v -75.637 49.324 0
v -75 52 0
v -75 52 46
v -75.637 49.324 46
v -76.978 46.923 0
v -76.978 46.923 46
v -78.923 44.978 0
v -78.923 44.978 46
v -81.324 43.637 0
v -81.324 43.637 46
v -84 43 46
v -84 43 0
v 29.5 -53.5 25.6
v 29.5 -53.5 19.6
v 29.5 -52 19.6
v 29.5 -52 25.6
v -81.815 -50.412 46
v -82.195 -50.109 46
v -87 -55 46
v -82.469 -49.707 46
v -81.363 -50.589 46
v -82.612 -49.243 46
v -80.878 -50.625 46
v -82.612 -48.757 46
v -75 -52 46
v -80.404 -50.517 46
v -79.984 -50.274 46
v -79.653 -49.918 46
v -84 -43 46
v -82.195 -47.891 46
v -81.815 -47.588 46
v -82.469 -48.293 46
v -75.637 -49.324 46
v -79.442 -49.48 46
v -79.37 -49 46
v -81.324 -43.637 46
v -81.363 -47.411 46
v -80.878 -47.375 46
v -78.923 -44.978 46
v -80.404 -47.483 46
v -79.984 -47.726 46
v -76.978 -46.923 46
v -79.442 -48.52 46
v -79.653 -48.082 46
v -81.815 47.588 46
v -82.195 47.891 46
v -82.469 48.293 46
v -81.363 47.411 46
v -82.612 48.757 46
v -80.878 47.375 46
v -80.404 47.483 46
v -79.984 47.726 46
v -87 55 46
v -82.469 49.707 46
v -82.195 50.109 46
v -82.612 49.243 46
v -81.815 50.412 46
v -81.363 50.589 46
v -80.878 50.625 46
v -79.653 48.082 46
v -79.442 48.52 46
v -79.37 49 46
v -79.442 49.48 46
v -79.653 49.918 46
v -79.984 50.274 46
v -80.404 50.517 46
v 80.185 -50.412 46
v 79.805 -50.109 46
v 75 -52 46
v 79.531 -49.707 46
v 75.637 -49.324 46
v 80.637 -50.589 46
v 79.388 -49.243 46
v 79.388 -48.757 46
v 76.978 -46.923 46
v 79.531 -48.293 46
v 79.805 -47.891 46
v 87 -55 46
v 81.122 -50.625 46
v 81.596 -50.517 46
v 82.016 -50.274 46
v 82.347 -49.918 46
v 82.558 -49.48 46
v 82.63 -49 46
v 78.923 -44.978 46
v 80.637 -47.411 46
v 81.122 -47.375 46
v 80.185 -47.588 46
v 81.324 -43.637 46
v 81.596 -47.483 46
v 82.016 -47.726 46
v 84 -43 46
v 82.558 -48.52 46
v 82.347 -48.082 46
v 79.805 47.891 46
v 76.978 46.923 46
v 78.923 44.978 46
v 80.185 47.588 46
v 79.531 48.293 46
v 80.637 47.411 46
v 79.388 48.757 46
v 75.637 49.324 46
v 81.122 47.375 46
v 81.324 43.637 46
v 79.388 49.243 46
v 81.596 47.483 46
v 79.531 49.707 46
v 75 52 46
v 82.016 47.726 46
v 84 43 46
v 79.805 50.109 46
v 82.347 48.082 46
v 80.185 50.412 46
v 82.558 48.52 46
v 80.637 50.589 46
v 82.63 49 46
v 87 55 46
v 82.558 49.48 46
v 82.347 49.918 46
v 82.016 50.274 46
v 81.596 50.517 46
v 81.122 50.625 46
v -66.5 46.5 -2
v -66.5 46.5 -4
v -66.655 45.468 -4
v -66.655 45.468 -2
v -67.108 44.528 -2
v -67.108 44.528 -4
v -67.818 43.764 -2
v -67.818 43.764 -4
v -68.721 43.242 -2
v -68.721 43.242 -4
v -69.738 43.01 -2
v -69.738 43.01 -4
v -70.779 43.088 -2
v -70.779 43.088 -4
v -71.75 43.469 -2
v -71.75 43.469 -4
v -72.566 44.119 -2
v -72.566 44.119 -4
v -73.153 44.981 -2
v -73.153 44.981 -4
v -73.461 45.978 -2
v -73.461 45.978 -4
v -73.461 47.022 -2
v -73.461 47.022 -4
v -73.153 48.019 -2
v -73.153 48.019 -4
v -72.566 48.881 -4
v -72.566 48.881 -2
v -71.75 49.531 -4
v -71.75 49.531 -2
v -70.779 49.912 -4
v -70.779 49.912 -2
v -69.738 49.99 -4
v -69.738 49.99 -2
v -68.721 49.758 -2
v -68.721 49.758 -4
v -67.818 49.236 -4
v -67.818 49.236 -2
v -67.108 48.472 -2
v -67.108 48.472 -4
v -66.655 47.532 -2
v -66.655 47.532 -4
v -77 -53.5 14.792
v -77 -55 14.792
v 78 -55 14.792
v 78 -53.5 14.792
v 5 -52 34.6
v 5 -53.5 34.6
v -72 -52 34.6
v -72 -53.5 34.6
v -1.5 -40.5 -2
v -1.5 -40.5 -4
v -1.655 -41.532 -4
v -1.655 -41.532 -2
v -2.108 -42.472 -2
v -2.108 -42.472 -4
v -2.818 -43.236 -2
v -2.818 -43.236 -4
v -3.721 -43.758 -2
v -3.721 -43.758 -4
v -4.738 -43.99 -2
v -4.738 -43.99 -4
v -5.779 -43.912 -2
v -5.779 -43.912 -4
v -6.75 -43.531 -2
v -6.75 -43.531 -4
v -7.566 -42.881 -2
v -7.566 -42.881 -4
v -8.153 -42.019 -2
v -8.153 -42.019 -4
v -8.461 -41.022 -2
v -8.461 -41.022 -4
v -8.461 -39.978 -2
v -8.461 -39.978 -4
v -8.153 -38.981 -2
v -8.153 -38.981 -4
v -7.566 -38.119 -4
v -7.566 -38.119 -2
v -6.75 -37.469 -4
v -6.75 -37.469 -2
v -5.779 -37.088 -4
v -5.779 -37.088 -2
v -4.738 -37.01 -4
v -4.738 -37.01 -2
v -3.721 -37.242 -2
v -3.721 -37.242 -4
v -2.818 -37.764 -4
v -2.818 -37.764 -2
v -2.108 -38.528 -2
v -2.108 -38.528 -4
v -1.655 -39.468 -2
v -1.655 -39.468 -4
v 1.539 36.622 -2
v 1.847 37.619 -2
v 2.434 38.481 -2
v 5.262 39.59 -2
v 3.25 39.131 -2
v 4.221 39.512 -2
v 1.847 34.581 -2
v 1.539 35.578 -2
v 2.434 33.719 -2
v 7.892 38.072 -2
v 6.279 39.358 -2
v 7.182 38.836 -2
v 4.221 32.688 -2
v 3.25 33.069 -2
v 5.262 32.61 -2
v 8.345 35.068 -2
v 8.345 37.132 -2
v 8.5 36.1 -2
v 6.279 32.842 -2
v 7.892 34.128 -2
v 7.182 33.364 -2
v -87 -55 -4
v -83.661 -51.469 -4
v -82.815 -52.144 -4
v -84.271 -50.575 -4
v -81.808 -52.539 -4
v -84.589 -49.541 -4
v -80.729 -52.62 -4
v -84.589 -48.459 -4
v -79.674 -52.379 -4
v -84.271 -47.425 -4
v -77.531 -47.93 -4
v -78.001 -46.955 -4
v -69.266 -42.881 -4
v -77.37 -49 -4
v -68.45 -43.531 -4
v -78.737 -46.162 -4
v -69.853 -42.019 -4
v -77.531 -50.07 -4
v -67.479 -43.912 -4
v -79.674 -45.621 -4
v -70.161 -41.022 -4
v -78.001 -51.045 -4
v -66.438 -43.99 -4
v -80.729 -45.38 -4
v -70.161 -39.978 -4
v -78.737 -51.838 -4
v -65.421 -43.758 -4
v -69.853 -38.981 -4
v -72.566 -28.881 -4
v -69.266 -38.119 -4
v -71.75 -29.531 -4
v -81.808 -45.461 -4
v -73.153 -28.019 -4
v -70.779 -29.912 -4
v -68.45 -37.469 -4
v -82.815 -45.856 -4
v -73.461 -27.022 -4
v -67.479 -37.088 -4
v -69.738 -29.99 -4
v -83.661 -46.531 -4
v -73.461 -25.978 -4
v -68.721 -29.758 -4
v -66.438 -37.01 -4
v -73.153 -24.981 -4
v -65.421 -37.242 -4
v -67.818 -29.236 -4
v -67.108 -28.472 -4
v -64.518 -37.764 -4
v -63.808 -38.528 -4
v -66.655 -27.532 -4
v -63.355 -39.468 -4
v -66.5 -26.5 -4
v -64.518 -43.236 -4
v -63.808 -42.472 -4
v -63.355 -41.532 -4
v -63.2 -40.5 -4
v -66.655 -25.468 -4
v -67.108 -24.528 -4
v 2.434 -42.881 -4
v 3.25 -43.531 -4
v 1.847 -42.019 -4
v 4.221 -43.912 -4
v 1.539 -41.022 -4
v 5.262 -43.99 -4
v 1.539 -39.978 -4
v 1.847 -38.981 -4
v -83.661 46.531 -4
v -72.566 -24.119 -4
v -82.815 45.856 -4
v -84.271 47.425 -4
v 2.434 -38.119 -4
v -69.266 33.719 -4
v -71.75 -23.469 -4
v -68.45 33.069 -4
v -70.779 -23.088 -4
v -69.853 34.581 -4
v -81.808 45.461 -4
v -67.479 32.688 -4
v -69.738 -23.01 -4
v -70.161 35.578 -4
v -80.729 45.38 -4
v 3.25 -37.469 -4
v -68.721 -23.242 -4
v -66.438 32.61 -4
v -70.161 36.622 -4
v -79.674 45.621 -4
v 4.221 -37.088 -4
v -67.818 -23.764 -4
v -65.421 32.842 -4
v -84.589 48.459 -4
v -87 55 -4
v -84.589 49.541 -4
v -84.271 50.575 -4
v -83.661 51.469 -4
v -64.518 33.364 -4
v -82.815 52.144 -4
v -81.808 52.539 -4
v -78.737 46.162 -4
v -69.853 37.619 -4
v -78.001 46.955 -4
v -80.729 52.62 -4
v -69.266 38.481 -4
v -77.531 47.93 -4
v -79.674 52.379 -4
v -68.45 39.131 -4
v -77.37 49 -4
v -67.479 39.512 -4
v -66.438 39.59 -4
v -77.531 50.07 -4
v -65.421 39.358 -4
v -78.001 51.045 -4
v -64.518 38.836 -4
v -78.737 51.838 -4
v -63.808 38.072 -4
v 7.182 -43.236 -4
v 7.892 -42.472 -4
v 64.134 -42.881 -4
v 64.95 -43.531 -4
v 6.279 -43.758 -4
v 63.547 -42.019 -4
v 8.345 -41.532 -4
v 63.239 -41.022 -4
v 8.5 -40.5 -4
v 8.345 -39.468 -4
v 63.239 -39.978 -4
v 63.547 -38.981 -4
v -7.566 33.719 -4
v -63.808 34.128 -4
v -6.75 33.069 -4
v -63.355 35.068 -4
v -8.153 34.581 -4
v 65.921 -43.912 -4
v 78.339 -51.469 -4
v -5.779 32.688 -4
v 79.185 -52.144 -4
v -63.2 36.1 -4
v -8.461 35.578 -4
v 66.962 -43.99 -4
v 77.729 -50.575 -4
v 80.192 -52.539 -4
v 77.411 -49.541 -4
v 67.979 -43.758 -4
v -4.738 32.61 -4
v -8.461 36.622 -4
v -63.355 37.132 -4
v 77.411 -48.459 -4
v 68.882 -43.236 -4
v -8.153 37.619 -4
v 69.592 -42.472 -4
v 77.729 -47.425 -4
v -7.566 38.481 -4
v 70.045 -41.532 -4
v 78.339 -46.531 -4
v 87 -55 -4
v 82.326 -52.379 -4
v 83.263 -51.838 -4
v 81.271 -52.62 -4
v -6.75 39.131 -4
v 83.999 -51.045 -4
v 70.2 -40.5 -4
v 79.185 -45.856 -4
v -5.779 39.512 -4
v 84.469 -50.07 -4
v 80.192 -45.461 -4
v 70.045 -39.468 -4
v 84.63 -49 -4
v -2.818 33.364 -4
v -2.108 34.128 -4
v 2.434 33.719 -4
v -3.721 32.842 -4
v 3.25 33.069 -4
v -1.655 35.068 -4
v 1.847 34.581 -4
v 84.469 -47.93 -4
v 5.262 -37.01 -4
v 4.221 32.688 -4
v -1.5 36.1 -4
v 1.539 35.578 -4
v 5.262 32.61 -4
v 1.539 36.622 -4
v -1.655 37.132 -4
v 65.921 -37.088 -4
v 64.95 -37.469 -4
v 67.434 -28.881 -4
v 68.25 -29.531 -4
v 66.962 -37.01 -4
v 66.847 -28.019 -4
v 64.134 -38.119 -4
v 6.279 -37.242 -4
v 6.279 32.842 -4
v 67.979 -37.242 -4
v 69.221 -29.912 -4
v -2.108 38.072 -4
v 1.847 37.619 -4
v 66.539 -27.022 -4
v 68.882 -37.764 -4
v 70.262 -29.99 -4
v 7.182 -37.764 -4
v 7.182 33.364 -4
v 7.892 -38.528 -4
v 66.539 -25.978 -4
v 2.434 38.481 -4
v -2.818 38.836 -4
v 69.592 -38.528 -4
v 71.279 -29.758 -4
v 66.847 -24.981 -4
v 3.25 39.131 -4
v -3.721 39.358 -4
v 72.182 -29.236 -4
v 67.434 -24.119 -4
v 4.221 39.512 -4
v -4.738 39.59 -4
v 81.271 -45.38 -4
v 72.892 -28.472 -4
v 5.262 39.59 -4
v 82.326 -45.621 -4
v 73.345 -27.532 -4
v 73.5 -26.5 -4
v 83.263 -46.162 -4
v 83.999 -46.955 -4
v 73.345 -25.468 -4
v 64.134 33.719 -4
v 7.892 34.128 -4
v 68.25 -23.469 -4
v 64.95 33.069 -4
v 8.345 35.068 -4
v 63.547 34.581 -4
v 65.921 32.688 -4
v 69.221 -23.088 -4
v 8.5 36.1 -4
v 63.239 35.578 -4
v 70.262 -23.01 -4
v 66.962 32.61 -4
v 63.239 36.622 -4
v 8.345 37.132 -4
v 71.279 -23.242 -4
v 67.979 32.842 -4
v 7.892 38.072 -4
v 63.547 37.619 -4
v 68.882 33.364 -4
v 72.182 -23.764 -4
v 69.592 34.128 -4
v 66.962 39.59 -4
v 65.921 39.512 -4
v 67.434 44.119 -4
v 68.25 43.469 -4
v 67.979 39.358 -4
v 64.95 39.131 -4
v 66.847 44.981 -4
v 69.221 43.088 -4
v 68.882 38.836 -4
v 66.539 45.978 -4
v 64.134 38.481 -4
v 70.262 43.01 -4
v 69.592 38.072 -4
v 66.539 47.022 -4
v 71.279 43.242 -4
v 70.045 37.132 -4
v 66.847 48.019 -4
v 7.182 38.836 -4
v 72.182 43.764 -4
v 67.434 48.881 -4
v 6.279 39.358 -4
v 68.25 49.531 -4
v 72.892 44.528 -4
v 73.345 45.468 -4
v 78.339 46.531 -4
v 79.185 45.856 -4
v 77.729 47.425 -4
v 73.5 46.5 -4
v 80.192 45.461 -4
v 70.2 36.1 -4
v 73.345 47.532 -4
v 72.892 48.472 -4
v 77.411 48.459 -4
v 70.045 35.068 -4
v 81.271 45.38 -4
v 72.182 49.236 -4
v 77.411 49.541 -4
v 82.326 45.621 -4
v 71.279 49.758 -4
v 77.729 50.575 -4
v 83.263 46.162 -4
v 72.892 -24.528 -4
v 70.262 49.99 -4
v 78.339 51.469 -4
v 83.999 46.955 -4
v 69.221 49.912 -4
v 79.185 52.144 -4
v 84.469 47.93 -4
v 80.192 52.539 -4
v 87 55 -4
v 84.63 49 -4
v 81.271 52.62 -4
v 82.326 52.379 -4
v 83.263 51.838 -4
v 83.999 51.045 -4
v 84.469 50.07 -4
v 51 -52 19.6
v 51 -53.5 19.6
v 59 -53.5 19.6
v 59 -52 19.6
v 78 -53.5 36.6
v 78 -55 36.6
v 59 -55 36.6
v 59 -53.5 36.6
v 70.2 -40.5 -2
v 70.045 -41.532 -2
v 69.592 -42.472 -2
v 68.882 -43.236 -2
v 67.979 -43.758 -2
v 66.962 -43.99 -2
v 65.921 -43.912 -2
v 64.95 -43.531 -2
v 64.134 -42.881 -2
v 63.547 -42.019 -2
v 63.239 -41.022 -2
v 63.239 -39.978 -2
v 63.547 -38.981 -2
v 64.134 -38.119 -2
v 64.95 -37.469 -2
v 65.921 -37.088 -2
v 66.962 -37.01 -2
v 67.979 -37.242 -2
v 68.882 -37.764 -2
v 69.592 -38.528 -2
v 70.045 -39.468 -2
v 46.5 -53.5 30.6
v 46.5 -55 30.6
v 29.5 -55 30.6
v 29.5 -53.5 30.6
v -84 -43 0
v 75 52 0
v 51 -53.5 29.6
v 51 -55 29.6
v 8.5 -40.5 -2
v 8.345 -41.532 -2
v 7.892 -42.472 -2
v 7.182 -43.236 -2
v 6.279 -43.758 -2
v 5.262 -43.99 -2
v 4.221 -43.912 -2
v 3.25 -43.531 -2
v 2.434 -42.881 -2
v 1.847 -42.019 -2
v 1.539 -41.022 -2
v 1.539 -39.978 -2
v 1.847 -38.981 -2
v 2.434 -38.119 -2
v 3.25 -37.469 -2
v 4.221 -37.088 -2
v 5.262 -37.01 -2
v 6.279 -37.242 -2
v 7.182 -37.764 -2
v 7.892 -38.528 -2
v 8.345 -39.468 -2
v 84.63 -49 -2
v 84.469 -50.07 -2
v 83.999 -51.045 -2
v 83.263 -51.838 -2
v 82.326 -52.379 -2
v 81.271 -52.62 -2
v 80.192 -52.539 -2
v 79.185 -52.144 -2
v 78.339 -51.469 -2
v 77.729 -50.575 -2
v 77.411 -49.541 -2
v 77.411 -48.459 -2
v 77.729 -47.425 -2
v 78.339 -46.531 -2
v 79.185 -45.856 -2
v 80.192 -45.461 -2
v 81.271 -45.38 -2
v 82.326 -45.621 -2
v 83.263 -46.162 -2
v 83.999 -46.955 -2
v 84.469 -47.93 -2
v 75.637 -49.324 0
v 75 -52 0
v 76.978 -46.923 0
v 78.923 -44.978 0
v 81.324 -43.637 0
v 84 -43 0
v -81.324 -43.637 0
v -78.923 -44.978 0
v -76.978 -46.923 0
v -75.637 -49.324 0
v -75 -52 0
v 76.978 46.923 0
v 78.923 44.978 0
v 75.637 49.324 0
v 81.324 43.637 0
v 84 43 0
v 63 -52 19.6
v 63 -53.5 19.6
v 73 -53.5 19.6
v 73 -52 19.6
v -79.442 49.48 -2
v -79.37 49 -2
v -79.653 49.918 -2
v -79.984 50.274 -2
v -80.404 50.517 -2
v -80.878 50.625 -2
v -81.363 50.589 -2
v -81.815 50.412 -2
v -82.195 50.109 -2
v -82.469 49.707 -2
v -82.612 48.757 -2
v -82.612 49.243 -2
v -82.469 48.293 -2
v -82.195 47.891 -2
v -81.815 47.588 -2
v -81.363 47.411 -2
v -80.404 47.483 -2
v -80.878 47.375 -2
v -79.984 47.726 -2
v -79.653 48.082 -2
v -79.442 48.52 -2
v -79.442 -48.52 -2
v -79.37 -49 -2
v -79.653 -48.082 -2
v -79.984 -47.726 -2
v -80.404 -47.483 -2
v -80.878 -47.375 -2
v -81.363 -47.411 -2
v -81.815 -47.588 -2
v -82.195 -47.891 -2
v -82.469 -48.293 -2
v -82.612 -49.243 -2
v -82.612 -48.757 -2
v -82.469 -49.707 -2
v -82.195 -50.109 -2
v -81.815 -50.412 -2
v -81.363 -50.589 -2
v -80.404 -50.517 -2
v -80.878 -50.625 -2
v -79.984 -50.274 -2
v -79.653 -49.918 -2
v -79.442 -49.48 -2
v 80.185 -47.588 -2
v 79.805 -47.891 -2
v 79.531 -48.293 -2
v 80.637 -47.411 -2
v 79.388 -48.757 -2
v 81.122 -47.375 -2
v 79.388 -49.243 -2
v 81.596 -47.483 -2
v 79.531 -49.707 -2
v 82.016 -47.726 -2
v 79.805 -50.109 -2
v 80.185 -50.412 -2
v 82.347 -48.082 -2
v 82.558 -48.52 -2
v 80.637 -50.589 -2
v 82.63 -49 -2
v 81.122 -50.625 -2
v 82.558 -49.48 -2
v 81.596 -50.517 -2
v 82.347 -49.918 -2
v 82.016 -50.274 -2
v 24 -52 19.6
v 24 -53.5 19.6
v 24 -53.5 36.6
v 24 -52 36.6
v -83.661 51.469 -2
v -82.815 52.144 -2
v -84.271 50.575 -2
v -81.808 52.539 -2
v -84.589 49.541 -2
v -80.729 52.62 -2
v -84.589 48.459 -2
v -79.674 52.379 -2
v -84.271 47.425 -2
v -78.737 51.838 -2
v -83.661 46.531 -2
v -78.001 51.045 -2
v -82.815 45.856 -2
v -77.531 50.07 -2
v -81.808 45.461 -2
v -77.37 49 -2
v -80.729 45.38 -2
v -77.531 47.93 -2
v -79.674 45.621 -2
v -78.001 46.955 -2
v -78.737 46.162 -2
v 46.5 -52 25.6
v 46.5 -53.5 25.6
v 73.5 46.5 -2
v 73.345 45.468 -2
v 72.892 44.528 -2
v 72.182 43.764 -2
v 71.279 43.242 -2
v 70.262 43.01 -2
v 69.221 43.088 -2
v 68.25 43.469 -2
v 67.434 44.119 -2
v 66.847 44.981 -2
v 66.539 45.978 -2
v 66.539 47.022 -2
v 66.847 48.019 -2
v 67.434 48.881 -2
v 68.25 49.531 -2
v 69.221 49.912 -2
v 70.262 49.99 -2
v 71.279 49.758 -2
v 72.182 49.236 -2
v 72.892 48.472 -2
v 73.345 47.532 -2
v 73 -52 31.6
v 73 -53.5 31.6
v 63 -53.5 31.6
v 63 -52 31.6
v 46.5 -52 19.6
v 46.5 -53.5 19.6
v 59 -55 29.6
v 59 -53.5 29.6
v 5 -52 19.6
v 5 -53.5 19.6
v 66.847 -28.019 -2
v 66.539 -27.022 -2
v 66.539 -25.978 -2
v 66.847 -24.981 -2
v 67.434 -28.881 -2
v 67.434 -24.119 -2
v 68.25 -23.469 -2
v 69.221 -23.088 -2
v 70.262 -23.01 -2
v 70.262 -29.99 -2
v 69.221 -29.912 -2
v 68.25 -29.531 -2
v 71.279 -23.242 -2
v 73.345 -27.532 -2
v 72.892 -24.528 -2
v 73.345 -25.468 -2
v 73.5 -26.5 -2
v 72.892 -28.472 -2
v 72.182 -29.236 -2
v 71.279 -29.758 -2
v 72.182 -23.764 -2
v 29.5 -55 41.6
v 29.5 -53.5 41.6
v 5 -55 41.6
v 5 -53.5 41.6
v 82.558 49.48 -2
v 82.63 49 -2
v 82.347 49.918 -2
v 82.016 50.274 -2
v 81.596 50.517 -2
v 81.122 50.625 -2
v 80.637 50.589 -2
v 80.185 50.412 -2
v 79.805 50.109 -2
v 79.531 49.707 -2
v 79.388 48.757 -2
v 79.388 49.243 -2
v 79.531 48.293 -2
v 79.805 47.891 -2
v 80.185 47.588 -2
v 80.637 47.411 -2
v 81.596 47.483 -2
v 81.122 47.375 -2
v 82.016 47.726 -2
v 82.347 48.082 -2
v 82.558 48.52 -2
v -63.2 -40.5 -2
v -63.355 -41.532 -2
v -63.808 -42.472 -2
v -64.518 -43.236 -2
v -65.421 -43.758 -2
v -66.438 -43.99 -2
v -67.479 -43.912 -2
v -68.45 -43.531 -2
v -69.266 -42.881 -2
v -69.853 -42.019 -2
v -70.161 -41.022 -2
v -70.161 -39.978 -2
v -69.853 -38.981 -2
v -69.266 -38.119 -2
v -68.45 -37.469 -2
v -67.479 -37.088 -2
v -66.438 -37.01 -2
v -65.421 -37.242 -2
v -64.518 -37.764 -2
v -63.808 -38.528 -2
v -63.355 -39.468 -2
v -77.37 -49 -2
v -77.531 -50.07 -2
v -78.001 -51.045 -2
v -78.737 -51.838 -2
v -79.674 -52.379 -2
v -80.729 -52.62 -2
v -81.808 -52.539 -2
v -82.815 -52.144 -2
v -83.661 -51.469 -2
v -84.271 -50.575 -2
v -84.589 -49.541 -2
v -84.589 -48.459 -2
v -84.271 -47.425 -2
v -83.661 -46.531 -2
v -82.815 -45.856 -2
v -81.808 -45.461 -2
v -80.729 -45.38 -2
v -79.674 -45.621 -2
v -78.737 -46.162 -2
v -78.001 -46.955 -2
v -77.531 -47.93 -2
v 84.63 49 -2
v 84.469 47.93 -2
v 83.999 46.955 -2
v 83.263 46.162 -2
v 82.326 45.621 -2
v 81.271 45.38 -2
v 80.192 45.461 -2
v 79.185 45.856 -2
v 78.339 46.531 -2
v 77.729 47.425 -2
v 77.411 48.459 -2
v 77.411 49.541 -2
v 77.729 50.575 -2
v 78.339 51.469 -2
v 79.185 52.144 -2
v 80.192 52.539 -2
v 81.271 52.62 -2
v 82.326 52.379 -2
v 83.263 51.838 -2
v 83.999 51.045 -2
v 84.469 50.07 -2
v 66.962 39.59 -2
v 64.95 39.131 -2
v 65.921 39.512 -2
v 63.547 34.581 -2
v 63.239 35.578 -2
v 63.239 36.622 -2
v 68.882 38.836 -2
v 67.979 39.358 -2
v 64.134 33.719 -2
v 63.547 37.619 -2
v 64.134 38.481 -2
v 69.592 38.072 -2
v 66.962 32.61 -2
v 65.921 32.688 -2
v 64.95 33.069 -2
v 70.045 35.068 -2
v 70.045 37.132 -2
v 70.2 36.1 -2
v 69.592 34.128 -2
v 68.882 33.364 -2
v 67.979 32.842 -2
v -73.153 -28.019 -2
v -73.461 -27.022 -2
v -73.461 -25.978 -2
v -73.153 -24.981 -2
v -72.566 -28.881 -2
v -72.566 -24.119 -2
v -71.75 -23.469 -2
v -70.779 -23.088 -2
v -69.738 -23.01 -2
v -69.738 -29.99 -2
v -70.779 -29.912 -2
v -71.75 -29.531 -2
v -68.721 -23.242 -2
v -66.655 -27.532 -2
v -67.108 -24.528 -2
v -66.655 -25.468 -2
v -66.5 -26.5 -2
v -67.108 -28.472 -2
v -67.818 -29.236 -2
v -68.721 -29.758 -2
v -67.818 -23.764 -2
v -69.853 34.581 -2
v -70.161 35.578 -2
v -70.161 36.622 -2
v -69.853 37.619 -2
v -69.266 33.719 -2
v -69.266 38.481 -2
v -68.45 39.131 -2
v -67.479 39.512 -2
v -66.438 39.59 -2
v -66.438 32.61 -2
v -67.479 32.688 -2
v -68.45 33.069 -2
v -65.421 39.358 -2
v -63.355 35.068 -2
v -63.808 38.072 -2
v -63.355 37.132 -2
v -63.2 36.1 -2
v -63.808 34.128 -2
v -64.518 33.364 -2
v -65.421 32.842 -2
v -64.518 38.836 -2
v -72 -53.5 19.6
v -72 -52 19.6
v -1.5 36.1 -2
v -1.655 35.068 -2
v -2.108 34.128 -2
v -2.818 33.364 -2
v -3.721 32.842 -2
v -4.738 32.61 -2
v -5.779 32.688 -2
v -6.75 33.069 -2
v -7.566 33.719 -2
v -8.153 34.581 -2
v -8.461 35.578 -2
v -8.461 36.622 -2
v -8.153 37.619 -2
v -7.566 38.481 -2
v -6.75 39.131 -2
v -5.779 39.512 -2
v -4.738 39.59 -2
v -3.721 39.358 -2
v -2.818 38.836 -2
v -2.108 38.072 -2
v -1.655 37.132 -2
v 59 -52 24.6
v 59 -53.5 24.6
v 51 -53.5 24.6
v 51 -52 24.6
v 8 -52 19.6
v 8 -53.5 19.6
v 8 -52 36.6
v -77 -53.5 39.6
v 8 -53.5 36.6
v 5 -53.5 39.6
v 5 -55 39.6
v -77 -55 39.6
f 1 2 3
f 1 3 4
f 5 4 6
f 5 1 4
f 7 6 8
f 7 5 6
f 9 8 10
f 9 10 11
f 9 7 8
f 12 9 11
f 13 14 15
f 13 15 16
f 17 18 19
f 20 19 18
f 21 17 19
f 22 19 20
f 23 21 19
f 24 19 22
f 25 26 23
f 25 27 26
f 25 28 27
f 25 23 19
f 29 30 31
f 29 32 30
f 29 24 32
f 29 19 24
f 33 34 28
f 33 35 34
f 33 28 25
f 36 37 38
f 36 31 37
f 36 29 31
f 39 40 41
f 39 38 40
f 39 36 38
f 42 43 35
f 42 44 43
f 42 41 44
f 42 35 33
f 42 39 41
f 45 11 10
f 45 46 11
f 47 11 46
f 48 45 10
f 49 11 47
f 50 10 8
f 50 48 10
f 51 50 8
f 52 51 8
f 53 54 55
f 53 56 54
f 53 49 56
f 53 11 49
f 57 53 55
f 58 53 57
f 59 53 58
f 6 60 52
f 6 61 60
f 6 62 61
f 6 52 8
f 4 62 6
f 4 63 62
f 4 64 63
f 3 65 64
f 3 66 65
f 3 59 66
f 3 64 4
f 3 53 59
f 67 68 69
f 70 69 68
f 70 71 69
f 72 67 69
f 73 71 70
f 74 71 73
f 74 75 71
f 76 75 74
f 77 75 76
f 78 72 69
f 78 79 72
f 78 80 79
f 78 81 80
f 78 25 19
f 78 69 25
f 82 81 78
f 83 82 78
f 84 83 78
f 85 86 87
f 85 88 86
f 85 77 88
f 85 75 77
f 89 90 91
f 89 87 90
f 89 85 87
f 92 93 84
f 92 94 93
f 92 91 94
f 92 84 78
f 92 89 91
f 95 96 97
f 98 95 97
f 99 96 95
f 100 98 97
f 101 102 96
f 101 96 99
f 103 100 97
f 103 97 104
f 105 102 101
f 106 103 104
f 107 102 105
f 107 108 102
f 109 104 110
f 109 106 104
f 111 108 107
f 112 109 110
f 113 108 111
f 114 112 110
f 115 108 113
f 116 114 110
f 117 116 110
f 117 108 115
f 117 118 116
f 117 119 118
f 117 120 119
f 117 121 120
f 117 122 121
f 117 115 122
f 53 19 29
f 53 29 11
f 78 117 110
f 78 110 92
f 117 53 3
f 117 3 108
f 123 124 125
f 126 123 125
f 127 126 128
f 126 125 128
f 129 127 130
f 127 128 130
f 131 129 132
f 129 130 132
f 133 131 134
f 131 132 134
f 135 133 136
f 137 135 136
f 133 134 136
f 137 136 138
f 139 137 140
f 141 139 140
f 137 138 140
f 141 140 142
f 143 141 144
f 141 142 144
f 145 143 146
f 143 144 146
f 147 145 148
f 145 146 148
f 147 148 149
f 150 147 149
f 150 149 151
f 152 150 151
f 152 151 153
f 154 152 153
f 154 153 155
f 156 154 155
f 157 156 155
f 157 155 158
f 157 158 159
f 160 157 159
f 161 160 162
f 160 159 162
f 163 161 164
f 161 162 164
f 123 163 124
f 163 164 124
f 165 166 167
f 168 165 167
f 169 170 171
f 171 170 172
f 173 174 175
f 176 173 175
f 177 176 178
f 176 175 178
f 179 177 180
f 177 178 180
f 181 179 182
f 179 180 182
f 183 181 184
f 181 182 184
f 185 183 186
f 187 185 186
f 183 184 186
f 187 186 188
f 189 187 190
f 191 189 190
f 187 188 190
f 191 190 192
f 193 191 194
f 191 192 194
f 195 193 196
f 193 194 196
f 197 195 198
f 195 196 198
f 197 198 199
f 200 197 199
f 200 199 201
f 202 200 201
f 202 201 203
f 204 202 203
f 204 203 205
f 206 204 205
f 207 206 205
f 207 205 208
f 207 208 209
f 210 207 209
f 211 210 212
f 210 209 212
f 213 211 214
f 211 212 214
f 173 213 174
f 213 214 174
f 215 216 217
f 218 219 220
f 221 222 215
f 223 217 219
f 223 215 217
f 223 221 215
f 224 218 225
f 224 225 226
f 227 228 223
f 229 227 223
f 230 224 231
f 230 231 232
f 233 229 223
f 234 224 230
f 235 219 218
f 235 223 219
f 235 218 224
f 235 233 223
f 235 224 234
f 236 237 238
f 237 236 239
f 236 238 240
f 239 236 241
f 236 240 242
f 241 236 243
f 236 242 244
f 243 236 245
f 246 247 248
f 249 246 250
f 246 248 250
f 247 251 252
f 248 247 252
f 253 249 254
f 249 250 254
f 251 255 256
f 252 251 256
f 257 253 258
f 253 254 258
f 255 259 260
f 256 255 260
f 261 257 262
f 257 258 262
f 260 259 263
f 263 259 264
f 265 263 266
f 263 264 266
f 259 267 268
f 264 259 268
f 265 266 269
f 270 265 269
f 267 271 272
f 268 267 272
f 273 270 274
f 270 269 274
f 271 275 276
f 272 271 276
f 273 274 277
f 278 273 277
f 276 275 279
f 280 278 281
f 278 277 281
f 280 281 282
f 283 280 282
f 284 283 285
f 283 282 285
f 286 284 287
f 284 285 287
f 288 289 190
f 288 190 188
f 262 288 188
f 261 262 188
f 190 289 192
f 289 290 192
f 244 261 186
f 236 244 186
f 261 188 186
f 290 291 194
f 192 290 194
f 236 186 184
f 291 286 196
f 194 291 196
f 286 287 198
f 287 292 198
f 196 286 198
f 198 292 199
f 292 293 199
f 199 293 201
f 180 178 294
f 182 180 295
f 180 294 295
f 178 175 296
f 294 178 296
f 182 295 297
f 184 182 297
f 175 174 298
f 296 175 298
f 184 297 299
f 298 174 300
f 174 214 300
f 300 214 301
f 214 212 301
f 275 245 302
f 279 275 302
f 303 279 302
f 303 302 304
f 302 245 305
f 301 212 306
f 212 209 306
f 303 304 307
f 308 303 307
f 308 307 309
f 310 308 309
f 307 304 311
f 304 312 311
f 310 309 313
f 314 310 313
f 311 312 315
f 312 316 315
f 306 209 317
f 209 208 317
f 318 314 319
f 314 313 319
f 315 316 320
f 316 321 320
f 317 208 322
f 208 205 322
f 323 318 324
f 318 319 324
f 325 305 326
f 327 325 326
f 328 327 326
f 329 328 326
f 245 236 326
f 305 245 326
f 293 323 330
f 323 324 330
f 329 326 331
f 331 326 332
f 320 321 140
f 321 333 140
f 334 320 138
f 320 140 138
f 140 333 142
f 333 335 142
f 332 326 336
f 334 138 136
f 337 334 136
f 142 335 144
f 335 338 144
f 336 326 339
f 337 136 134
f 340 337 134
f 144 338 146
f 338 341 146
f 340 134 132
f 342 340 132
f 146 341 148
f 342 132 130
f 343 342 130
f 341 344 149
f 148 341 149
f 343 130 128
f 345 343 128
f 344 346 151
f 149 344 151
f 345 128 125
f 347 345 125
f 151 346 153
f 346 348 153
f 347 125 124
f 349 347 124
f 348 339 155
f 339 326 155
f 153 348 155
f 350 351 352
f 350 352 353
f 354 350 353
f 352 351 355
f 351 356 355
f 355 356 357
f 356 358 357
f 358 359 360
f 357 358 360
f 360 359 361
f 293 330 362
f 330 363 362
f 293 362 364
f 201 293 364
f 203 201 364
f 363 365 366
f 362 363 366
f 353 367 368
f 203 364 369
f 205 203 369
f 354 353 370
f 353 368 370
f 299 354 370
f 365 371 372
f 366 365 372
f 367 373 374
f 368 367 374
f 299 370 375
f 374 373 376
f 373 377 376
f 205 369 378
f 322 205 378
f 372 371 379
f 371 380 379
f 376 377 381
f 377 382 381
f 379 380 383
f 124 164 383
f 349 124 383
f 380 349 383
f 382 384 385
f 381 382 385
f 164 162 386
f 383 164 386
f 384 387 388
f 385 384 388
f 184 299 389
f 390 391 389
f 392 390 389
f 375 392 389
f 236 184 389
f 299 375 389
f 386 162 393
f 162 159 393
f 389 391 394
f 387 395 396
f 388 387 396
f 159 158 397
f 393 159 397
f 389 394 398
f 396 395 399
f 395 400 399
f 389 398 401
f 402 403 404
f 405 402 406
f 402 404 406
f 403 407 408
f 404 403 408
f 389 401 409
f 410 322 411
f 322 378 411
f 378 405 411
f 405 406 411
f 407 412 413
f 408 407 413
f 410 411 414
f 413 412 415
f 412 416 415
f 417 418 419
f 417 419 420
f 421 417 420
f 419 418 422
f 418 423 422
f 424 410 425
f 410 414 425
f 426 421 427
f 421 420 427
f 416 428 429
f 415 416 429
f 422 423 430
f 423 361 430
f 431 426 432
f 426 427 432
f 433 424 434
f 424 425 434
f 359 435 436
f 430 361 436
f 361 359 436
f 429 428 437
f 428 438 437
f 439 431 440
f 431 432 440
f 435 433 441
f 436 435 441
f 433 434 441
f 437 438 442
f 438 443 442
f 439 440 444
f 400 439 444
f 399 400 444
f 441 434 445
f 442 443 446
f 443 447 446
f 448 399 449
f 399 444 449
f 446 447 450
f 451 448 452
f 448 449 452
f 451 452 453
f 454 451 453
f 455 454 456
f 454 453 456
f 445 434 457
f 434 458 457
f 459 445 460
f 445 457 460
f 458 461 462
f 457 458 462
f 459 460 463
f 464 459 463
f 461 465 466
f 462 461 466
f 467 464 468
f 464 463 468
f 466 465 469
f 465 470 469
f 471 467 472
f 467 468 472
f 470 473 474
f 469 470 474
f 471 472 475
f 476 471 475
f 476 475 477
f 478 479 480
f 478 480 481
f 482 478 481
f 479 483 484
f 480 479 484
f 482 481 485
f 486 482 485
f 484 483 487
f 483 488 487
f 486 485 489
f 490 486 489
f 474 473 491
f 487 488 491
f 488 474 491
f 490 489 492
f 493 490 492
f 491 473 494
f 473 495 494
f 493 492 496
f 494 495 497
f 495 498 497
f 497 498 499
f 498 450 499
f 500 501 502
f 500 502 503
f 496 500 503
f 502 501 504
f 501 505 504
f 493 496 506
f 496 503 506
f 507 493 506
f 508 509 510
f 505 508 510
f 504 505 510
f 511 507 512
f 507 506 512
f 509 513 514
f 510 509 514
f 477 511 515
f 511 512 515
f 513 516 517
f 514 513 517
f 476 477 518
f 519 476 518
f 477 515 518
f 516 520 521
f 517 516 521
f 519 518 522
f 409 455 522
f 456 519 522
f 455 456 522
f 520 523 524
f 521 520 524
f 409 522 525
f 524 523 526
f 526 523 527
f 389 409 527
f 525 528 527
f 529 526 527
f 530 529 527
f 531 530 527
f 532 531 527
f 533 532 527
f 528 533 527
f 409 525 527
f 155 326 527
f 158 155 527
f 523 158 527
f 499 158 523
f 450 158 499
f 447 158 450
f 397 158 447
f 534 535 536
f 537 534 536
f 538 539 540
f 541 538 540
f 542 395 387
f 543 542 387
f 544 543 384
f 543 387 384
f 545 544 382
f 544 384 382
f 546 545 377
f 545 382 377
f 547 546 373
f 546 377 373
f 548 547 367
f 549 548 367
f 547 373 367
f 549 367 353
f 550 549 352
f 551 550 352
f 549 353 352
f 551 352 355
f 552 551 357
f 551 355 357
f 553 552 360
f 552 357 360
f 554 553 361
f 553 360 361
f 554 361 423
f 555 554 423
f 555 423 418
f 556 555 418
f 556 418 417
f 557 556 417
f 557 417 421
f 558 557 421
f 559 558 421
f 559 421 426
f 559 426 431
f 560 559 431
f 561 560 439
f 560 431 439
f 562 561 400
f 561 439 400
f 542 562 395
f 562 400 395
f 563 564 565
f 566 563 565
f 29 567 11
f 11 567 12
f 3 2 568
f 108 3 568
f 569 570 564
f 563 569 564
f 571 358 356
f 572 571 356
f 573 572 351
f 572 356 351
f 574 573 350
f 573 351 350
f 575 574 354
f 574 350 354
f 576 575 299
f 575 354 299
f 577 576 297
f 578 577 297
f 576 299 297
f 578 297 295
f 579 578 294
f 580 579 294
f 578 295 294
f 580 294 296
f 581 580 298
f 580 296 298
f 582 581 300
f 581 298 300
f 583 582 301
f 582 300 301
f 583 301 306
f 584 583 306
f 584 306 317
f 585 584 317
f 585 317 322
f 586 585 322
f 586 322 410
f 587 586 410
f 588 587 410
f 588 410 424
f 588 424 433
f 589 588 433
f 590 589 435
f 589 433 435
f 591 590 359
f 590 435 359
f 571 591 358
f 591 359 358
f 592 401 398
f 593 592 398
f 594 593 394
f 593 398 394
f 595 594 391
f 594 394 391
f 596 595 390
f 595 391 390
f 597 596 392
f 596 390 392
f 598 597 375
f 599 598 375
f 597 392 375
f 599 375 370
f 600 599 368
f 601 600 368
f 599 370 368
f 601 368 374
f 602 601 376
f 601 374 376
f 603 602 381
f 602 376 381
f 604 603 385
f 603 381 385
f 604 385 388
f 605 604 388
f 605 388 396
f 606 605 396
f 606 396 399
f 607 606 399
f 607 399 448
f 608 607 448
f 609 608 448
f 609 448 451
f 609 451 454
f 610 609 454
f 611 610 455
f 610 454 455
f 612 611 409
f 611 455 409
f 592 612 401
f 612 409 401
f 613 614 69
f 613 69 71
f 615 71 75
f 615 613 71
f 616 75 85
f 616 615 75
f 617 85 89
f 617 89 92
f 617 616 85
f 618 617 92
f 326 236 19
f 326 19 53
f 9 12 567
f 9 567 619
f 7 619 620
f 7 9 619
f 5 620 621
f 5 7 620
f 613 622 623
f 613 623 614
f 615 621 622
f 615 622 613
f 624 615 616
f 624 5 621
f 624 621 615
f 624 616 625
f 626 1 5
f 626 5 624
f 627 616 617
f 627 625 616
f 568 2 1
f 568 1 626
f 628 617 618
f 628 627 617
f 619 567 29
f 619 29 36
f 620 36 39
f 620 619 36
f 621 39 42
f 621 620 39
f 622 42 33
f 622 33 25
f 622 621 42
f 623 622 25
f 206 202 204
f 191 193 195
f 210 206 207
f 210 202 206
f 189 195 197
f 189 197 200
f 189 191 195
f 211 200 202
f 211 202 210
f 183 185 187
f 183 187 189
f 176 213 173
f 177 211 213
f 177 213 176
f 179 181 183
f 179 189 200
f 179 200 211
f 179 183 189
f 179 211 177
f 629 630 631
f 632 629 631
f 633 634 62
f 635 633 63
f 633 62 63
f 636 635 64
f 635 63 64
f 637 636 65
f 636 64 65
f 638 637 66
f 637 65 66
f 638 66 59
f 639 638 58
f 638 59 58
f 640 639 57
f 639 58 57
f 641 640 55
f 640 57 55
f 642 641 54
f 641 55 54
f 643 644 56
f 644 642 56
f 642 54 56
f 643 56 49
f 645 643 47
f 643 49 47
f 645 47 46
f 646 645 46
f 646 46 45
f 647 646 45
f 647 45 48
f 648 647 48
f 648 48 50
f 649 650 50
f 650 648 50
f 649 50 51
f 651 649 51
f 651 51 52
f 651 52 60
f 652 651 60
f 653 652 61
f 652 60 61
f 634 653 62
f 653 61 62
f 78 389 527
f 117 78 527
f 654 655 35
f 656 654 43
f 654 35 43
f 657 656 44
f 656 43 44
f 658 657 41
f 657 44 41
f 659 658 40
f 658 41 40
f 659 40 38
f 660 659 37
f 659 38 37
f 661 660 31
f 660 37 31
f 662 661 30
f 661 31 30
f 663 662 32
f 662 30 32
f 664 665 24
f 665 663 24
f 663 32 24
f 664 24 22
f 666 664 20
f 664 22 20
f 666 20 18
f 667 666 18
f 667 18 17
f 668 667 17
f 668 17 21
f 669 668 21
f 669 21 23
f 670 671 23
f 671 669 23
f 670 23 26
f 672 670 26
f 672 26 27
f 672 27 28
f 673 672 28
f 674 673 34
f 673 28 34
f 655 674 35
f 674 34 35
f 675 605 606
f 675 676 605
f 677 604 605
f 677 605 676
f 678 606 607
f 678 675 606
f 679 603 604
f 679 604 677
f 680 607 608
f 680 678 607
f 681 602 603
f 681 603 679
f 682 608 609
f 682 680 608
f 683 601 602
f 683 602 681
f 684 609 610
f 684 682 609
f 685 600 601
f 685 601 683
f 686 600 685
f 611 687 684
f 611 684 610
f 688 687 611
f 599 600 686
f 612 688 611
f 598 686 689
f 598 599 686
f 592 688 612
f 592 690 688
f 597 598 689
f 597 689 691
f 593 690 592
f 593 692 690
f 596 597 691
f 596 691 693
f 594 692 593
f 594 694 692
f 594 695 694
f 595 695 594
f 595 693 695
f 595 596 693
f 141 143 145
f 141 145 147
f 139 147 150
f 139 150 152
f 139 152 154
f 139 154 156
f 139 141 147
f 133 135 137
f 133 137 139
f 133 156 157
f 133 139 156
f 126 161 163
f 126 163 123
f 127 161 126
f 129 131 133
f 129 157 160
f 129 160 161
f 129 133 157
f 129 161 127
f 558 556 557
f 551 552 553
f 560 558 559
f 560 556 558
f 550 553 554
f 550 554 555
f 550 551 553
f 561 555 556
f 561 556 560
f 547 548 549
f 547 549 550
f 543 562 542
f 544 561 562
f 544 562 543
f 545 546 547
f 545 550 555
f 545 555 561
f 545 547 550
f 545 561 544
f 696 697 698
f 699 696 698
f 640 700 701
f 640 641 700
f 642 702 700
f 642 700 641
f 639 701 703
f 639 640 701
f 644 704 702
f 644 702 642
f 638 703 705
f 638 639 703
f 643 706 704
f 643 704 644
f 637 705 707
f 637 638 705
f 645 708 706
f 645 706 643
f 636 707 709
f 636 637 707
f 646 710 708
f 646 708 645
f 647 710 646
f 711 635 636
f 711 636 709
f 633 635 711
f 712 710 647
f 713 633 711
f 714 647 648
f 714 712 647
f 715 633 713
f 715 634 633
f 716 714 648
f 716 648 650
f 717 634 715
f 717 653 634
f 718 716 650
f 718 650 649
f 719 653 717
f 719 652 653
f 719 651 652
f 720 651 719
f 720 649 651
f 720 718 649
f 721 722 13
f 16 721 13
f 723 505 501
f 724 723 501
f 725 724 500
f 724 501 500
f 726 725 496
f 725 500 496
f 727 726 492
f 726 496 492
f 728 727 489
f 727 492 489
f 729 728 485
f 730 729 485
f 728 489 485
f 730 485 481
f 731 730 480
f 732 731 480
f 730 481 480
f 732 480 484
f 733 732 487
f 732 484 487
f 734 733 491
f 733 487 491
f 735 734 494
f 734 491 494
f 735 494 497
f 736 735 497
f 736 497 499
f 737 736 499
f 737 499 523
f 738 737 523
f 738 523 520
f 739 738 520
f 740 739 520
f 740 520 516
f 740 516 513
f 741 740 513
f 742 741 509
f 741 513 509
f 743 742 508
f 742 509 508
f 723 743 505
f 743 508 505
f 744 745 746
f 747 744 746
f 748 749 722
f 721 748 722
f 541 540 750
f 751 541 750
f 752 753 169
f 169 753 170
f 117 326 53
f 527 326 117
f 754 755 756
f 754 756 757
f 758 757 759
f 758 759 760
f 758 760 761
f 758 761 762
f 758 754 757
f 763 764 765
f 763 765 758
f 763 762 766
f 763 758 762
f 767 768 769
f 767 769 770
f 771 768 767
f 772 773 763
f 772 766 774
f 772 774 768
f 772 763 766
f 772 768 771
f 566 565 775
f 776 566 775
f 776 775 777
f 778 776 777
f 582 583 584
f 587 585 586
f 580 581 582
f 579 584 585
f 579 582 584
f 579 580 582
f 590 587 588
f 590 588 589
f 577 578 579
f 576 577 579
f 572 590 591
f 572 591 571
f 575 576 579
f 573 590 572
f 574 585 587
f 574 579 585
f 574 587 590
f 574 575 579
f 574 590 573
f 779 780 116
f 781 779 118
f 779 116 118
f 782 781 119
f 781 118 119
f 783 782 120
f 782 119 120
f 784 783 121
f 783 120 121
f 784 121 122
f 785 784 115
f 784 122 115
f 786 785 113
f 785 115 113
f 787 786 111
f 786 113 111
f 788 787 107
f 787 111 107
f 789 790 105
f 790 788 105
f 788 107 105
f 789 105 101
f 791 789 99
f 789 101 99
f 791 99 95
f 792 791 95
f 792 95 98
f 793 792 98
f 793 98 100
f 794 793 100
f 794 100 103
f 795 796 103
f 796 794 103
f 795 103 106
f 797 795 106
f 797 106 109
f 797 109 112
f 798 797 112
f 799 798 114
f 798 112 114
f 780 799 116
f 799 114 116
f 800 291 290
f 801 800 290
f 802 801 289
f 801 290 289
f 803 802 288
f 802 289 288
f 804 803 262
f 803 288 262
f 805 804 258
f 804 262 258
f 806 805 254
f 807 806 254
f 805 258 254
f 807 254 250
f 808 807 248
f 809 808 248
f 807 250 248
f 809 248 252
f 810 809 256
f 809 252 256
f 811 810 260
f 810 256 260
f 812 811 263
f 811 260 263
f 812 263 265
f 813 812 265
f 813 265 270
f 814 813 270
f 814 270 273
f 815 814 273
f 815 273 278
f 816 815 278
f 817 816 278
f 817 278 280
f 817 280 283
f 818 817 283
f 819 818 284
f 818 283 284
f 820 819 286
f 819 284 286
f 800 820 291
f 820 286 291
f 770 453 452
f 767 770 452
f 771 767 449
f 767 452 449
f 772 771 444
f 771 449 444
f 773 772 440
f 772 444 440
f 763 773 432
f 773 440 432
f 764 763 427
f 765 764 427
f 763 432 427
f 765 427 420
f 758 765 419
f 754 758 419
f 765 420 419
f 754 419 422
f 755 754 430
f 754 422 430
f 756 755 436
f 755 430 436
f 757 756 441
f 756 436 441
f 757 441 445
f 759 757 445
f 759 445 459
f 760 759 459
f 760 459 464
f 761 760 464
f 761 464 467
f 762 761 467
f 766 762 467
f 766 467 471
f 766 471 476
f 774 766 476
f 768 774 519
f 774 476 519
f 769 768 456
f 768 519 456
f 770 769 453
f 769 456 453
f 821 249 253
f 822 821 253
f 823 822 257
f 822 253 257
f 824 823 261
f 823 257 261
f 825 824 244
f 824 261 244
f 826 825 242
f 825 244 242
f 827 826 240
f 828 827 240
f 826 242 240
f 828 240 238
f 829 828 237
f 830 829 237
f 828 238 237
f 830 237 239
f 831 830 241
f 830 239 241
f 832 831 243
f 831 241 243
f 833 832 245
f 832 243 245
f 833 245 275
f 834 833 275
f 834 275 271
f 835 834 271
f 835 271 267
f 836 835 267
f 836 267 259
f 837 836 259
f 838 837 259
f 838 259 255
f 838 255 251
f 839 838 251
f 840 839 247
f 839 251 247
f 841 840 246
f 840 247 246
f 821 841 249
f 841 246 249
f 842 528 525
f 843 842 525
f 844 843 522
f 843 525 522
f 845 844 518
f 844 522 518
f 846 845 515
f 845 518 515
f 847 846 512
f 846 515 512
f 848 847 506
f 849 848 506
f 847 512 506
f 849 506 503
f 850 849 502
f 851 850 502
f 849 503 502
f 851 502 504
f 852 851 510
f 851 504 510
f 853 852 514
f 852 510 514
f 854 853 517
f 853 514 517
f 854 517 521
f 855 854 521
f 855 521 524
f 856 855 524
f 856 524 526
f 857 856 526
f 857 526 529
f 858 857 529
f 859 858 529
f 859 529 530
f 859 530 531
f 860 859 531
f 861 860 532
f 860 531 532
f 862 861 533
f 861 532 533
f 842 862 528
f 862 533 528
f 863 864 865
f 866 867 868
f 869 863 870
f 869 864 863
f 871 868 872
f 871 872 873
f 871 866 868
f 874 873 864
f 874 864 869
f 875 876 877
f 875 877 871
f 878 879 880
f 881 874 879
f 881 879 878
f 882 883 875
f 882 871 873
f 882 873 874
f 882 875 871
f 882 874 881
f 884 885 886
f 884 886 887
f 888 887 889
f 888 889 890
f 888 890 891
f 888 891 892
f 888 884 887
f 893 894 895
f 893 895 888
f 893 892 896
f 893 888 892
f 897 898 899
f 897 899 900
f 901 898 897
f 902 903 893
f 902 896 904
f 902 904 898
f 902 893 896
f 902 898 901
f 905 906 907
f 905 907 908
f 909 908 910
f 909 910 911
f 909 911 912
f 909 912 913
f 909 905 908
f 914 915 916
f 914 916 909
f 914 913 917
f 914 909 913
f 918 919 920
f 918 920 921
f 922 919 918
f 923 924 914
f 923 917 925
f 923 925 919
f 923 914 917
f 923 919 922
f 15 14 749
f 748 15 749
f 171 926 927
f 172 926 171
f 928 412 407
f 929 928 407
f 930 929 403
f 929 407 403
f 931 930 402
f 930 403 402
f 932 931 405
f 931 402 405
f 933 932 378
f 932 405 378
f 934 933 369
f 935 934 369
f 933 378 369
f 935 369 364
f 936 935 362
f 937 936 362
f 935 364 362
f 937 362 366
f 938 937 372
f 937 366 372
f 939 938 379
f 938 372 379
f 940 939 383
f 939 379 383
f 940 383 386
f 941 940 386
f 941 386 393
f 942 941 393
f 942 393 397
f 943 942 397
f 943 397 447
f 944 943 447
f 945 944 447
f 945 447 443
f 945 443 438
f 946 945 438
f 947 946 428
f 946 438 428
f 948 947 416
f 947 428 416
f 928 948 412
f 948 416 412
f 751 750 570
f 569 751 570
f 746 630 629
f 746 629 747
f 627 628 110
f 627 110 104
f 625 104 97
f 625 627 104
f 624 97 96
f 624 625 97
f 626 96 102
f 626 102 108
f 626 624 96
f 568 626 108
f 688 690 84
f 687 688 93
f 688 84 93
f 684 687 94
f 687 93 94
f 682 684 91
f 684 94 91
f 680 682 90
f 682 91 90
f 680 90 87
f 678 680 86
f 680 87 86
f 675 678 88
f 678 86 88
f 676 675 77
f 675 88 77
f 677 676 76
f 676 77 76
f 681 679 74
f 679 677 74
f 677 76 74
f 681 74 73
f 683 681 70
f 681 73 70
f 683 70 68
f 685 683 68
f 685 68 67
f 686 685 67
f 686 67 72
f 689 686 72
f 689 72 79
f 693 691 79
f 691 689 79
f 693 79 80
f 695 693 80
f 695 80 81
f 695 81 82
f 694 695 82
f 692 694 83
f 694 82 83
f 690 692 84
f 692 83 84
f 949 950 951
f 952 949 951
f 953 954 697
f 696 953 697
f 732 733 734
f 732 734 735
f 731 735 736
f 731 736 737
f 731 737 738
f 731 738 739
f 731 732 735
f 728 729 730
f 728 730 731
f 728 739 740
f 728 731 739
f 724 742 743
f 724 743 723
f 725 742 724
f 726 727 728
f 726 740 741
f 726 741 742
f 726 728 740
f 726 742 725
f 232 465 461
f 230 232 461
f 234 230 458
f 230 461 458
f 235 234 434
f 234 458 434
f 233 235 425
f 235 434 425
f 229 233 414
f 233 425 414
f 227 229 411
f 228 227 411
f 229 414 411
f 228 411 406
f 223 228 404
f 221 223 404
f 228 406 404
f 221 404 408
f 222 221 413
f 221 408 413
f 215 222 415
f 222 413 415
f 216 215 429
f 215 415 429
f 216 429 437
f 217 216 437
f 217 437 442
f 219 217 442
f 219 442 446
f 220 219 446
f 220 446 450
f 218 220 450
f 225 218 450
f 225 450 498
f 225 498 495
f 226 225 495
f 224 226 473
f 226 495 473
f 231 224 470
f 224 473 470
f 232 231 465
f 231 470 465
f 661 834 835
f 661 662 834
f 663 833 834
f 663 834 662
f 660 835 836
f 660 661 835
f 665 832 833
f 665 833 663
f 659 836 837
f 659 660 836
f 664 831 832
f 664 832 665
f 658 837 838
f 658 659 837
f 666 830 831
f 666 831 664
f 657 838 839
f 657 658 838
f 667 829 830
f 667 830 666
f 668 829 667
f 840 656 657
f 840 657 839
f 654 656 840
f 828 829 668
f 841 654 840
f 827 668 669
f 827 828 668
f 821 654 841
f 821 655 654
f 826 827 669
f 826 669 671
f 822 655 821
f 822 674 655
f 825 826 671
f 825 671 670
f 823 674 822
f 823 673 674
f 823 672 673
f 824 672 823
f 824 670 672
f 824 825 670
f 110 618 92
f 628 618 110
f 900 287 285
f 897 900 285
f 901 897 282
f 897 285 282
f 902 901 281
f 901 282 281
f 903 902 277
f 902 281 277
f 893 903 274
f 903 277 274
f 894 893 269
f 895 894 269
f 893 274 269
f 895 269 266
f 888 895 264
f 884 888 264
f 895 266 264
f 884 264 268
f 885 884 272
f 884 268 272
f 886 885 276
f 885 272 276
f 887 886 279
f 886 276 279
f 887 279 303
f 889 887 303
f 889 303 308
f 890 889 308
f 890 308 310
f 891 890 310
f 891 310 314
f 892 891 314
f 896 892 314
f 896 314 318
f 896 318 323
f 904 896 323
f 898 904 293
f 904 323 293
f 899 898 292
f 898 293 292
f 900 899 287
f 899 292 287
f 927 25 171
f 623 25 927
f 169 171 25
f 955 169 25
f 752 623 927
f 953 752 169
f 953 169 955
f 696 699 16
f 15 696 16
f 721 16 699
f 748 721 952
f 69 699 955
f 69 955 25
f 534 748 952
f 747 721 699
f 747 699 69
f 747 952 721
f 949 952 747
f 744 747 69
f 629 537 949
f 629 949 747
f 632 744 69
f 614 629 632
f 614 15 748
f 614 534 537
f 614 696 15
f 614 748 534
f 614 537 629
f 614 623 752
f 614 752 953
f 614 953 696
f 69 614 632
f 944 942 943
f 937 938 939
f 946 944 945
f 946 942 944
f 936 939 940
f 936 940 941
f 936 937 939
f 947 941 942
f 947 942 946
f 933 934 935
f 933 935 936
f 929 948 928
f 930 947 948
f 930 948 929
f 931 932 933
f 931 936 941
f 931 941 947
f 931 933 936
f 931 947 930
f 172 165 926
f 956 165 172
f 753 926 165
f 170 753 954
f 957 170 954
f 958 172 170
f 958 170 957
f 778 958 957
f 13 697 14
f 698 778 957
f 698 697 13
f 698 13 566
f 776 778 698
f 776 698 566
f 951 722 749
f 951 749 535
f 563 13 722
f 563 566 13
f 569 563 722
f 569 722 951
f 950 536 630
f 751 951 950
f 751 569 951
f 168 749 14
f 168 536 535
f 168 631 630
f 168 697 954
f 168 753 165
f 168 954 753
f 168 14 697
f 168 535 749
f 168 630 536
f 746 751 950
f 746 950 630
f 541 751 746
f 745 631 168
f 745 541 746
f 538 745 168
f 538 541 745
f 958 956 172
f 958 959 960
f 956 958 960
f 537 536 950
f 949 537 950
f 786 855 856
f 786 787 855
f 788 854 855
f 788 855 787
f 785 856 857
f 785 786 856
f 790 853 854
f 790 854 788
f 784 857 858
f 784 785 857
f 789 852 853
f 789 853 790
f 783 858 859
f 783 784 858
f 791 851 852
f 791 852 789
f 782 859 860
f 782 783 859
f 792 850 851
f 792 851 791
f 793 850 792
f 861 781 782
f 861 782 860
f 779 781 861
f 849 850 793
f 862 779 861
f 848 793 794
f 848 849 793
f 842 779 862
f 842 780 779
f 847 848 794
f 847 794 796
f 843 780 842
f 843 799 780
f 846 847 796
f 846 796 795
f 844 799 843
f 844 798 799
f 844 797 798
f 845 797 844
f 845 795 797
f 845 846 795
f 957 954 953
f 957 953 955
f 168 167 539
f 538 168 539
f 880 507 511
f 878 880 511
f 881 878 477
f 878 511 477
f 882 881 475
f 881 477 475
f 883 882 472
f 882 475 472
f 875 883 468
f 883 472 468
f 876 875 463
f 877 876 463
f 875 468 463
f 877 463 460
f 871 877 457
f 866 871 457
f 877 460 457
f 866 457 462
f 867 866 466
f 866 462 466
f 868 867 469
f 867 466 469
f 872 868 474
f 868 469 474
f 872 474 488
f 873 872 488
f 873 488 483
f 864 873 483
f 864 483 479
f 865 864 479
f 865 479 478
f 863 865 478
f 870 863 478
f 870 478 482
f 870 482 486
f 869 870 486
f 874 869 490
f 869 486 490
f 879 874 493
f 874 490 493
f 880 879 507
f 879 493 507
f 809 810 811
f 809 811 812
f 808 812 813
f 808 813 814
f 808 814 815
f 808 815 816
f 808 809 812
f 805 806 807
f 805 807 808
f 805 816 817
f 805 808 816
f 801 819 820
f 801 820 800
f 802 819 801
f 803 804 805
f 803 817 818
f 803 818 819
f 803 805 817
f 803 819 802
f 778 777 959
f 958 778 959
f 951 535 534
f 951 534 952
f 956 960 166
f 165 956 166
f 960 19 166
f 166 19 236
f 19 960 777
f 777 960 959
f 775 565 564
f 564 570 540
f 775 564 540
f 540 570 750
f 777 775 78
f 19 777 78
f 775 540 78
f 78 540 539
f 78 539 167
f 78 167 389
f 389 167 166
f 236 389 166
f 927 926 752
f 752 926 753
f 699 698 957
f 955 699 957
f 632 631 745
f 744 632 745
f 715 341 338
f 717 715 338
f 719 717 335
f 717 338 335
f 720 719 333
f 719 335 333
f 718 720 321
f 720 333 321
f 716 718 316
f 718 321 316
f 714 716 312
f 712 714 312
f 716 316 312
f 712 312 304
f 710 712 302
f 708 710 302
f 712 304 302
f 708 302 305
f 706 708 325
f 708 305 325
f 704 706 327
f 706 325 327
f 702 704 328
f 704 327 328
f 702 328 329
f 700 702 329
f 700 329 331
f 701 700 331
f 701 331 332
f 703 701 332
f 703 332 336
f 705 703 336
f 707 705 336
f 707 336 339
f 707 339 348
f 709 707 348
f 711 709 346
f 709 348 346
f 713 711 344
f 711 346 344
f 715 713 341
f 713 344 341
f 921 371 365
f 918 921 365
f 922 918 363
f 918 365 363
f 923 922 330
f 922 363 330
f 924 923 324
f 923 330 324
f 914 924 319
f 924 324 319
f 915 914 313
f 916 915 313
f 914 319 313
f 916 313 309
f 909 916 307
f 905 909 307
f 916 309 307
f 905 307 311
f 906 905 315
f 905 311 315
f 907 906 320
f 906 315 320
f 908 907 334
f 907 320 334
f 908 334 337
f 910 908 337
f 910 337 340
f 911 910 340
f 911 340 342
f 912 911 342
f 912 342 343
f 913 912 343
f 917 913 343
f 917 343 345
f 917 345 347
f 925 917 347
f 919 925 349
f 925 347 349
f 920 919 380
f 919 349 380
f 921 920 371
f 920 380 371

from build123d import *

# Parameters (mm, degrees)
F0_W         = 174
F0_H         = 110
F1_DEPTH     = 4
F2_W         = 174
F2_H         = 110
F2_W_2       = 168
F2_H_2       = 104
F3_DEPTH     = 46
F5_R         = 3.5
F6_DEPTH     = 2
F7_W         = 38.5
F7_H         = 15
F7_W_2       = 8
F7_H_2       = 17
F7_W_3       = 8.5
F7_H_3       = 6
F7_W_4       = 4
F7_H_4       = 5
F7_W_5       = 5
F7_H_5       = 12
F8_DEPTH     = 3
F9_W         = 9
F9_H         = 9
F9_R         = 1.63
F10_DEPTH    = 46
F11_DEPTH    = 50.001
F12_T1_DEPTH = 68.5
F13_R        = 3.63
F13_R_2      = 1.63
F14_DEPTH    = 2
F15_DEPTH    = 1.5


# Not quite as in the source:
# - a fillet or chamfer that OpenCascade refuses, or shapes differently, is made with other operations: its cross-section is extruded or revolved along the edge and cut away or added


with BuildPart() as f1:
    # F0 (on Top) → F1 (new body)
    with BuildSketch(Plane.XY):
        Rectangle(F0_W, F0_H)
    extrude(amount=-F1_DEPTH)

    # F2 (on face) → F3 (join)
    with BuildSketch(Plane.XY):
        Rectangle(F2_W, F2_H)
        Rectangle(F2_W_2, F2_H_2, mode=Mode.SUBTRACT)
    extrude(amount=F3_DEPTH)

    # F5 (on face) → F6 (cut)
    with BuildSketch(Plane(origin=(0, 0, -4), x_dir=(1, 0, 0), z_dir=(0, 0, -1))):
        with Locations((-66.7, 40.5)):
            Circle(F5_R)
        with Locations((-70, 26.5)):
            Circle(F5_R)
        with Locations((-66.7, -36.1)):
            Circle(F5_R)
        with Locations((-70, -46.5)):
            Circle(F5_R)
        with Locations((-5, -36.1)):
            Circle(F5_R)
        with Locations((5, -36.1)):
            Circle(F5_R)
        with Locations((-5, 40.5)):
            Circle(F5_R)
        with Locations((5, 40.5)):
            Circle(F5_R)
        with Locations((66.7, 40.5)):
            Circle(F5_R)
        with Locations((70, 26.5)):
            Circle(F5_R)
        with Locations((66.7, -36.1)):
            Circle(F5_R)
        with Locations((70, -46.5)):
            Circle(F5_R)
    extrude(amount=-F6_DEPTH, mode=Mode.SUBTRACT)

    # F7 (on face) → F8 (cut)
    with BuildSketch(Plane.XZ.offset(55)):
        with Locations((-52.75, 27.1)):
            Rectangle(F7_W, F7_H)
        with Locations((-14.25, 27.1)):
            Rectangle(F7_W, F7_H)
        with Locations((12, 28.1)):
            Rectangle(F7_W_2, F7_H_2)
        with Locations((20, 28.1)):
            Rectangle(F7_W_2, F7_H_2)
        with Locations((33.75, 22.6)):
            Rectangle(F7_W_3, F7_H_3)
        with Locations((42.25, 22.6)):
            Rectangle(F7_W_3, F7_H_3)
        with Locations((53, 22.1)):
            Rectangle(F7_W_4, F7_H_4)
        with Locations((57, 22.1)):
            Rectangle(F7_W_4, F7_H_4)
        with Locations((65.5, 25.6)):
            Rectangle(F7_W_5, F7_H_5)
        with Locations((70.5, 25.6)):
            Rectangle(F7_W_5, F7_H_5)
    extrude(amount=-F8_DEPTH, mode=Mode.SUBTRACT)

    # F9 (on face) → F10 (join)
    with BuildSketch(Plane.XY.offset(46)):
        with Locations((-79.5, 47.5)):
            Rectangle(F9_W, F9_H)
        with Locations((-81, 49)):
            Circle(F9_R, mode=Mode.SUBTRACT)
        Polygon((-75, 55), (-87, 55), (-87, 43), (-84, 43), (-84, 52), (-75, 52), align=None)
        Polygon((87, 55), (75, 55), (75, 52), (84, 52), (84, 43), (87, 43), align=None)
        with Locations((79.5, 47.5)):
            Rectangle(F9_W, F9_H)
        with Locations((81, 49)):
            Circle(F9_R, mode=Mode.SUBTRACT)
        Polygon((87, -55), (87, -43), (84, -43), (84, -52), (75, -52), (75, -55), align=None)
        with Locations((79.5, -47.5)):
            Rectangle(F9_W, F9_H)
        with Locations((81, -49)):
            Circle(F9_R, mode=Mode.SUBTRACT)
        with Locations((-79.5, -47.5)):
            Rectangle(F9_W, F9_H)
        with Locations((-81, -49)):
            Circle(F9_R, mode=Mode.SUBTRACT)
        Polygon((-84, -43), (-87, -43), (-87, -55), (-75, -55), (-75, -52), (-84, -52), align=None)
    extrude(amount=-F10_DEPTH)

    # F9 (on face) → F11 (cut, through all)
    with BuildSketch(Plane.XY.offset(46)):
        with Locations((-81, 49)):
            Circle(F9_R)
        with Locations((81, 49)):
            Circle(F9_R)
        with Locations((81, -49)):
            Circle(F9_R)
        with Locations((-81, -49)):
            Circle(F9_R)
    extrude(amount=-F11_DEPTH, mode=Mode.SUBTRACT)

    # F12: fillet of radius 10 on 4 edges, made by hand

    # F12_s2 → F12_t1 (cut)
    with BuildSketch(Plane.XY):
        with BuildLine():
            ThreePointArc((-75, 52), (-77.8832882455, 45.8832882455), (-84, 43))
            Line((-84, 43), (-75, 43))
            Line((-75, 43), (-75, 52))
        make_face()
        with BuildLine():
            ThreePointArc((84, 43), (77.8832882455, 45.8832882455), (75, 52))
            Line((75, 52), (75, 43))
            Line((75, 43), (84, 43))
        make_face()
        with BuildLine():
            ThreePointArc((-84, -43), (-77.8832882455, -45.8832882455), (-75, -52))
            Line((-75, -52), (-75, -43))
            Line((-75, -43), (-84, -43))
        make_face()
        with BuildLine():
            ThreePointArc((75, -52), (77.8832882455, -45.8832882455), (84, -43))
            Line((84, -43), (75, -43))
            Line((75, -43), (75, -52))
        make_face()
    extrude(amount=F12_T1_DEPTH, mode=Mode.SUBTRACT)

    # F13 (on face) → F14 (cut)
    with BuildSketch(Plane(origin=(0, 0, -4), x_dir=(1, 0, 0), z_dir=(0, 0, -1))):
        with Locations((-81, 49)):
            Circle(F13_R)
        with Locations((-81, 49)):
            Circle(F13_R_2, mode=Mode.SUBTRACT)
        with Locations((81, 49)):
            Circle(F13_R)
        with Locations((81, 49)):
            Circle(F13_R_2, mode=Mode.SUBTRACT)
        with Locations((81, -49)):
            Circle(F13_R)
        with Locations((81, -49)):
            Circle(F13_R_2, mode=Mode.SUBTRACT)
        with Locations((-81, -49)):
            Circle(F13_R)
        with Locations((-81, -49)):
            Circle(F13_R_2, mode=Mode.SUBTRACT)
    extrude(amount=-F14_DEPTH, mode=Mode.SUBTRACT)

    # F7 (on face) → F15 (cut)
    with BuildSketch(Plane.XZ.offset(55)):
        Polygon((-77, 34.6), (-77, 19.7916162387), (-77, 14.7916162387), (78, 14.7916162387), (78, 19.6), (78, 31.6), (78, 36.6), (73, 36.6), (68, 36.6), (63, 36.6), (59, 36.6), (59, 29.6), (55, 29.6), (51, 29.6), (46.5, 30.6), (38, 30.6), (29.5, 30.6), (29.5, 41.6), (24, 41.6), (16, 41.6), (8, 41.6), (5, 41.6), (5, 39.6), (-33.5, 39.6), (-72, 39.6), (-77, 39.6), align=None)
        Polygon((5, 19.6), (-33.5, 19.6), (-72, 19.6), (-72, 34.6), (-33.5, 34.6), (5, 34.6), align=None, mode=Mode.SUBTRACT)
        Polygon((46.5, 19.6), (38, 19.6), (29.5, 19.6), (29.5, 25.6), (38, 25.6), (46.5, 25.6), align=None, mode=Mode.SUBTRACT)
        Polygon((24, 19.6), (16, 19.6), (8, 19.6), (8, 36.6), (16, 36.6), (24, 36.6), align=None, mode=Mode.SUBTRACT)
        Polygon((59, 19.6), (55, 19.6), (51, 19.6), (51, 24.6), (55, 24.6), (59, 24.6), align=None, mode=Mode.SUBTRACT)
        Polygon((73, 19.6), (68, 19.6), (63, 19.6), (63, 31.6), (68, 31.6), (73, 31.6), align=None, mode=Mode.SUBTRACT)
    extrude(amount=-F15_DEPTH, mode=Mode.SUBTRACT)


solid = f1.part
